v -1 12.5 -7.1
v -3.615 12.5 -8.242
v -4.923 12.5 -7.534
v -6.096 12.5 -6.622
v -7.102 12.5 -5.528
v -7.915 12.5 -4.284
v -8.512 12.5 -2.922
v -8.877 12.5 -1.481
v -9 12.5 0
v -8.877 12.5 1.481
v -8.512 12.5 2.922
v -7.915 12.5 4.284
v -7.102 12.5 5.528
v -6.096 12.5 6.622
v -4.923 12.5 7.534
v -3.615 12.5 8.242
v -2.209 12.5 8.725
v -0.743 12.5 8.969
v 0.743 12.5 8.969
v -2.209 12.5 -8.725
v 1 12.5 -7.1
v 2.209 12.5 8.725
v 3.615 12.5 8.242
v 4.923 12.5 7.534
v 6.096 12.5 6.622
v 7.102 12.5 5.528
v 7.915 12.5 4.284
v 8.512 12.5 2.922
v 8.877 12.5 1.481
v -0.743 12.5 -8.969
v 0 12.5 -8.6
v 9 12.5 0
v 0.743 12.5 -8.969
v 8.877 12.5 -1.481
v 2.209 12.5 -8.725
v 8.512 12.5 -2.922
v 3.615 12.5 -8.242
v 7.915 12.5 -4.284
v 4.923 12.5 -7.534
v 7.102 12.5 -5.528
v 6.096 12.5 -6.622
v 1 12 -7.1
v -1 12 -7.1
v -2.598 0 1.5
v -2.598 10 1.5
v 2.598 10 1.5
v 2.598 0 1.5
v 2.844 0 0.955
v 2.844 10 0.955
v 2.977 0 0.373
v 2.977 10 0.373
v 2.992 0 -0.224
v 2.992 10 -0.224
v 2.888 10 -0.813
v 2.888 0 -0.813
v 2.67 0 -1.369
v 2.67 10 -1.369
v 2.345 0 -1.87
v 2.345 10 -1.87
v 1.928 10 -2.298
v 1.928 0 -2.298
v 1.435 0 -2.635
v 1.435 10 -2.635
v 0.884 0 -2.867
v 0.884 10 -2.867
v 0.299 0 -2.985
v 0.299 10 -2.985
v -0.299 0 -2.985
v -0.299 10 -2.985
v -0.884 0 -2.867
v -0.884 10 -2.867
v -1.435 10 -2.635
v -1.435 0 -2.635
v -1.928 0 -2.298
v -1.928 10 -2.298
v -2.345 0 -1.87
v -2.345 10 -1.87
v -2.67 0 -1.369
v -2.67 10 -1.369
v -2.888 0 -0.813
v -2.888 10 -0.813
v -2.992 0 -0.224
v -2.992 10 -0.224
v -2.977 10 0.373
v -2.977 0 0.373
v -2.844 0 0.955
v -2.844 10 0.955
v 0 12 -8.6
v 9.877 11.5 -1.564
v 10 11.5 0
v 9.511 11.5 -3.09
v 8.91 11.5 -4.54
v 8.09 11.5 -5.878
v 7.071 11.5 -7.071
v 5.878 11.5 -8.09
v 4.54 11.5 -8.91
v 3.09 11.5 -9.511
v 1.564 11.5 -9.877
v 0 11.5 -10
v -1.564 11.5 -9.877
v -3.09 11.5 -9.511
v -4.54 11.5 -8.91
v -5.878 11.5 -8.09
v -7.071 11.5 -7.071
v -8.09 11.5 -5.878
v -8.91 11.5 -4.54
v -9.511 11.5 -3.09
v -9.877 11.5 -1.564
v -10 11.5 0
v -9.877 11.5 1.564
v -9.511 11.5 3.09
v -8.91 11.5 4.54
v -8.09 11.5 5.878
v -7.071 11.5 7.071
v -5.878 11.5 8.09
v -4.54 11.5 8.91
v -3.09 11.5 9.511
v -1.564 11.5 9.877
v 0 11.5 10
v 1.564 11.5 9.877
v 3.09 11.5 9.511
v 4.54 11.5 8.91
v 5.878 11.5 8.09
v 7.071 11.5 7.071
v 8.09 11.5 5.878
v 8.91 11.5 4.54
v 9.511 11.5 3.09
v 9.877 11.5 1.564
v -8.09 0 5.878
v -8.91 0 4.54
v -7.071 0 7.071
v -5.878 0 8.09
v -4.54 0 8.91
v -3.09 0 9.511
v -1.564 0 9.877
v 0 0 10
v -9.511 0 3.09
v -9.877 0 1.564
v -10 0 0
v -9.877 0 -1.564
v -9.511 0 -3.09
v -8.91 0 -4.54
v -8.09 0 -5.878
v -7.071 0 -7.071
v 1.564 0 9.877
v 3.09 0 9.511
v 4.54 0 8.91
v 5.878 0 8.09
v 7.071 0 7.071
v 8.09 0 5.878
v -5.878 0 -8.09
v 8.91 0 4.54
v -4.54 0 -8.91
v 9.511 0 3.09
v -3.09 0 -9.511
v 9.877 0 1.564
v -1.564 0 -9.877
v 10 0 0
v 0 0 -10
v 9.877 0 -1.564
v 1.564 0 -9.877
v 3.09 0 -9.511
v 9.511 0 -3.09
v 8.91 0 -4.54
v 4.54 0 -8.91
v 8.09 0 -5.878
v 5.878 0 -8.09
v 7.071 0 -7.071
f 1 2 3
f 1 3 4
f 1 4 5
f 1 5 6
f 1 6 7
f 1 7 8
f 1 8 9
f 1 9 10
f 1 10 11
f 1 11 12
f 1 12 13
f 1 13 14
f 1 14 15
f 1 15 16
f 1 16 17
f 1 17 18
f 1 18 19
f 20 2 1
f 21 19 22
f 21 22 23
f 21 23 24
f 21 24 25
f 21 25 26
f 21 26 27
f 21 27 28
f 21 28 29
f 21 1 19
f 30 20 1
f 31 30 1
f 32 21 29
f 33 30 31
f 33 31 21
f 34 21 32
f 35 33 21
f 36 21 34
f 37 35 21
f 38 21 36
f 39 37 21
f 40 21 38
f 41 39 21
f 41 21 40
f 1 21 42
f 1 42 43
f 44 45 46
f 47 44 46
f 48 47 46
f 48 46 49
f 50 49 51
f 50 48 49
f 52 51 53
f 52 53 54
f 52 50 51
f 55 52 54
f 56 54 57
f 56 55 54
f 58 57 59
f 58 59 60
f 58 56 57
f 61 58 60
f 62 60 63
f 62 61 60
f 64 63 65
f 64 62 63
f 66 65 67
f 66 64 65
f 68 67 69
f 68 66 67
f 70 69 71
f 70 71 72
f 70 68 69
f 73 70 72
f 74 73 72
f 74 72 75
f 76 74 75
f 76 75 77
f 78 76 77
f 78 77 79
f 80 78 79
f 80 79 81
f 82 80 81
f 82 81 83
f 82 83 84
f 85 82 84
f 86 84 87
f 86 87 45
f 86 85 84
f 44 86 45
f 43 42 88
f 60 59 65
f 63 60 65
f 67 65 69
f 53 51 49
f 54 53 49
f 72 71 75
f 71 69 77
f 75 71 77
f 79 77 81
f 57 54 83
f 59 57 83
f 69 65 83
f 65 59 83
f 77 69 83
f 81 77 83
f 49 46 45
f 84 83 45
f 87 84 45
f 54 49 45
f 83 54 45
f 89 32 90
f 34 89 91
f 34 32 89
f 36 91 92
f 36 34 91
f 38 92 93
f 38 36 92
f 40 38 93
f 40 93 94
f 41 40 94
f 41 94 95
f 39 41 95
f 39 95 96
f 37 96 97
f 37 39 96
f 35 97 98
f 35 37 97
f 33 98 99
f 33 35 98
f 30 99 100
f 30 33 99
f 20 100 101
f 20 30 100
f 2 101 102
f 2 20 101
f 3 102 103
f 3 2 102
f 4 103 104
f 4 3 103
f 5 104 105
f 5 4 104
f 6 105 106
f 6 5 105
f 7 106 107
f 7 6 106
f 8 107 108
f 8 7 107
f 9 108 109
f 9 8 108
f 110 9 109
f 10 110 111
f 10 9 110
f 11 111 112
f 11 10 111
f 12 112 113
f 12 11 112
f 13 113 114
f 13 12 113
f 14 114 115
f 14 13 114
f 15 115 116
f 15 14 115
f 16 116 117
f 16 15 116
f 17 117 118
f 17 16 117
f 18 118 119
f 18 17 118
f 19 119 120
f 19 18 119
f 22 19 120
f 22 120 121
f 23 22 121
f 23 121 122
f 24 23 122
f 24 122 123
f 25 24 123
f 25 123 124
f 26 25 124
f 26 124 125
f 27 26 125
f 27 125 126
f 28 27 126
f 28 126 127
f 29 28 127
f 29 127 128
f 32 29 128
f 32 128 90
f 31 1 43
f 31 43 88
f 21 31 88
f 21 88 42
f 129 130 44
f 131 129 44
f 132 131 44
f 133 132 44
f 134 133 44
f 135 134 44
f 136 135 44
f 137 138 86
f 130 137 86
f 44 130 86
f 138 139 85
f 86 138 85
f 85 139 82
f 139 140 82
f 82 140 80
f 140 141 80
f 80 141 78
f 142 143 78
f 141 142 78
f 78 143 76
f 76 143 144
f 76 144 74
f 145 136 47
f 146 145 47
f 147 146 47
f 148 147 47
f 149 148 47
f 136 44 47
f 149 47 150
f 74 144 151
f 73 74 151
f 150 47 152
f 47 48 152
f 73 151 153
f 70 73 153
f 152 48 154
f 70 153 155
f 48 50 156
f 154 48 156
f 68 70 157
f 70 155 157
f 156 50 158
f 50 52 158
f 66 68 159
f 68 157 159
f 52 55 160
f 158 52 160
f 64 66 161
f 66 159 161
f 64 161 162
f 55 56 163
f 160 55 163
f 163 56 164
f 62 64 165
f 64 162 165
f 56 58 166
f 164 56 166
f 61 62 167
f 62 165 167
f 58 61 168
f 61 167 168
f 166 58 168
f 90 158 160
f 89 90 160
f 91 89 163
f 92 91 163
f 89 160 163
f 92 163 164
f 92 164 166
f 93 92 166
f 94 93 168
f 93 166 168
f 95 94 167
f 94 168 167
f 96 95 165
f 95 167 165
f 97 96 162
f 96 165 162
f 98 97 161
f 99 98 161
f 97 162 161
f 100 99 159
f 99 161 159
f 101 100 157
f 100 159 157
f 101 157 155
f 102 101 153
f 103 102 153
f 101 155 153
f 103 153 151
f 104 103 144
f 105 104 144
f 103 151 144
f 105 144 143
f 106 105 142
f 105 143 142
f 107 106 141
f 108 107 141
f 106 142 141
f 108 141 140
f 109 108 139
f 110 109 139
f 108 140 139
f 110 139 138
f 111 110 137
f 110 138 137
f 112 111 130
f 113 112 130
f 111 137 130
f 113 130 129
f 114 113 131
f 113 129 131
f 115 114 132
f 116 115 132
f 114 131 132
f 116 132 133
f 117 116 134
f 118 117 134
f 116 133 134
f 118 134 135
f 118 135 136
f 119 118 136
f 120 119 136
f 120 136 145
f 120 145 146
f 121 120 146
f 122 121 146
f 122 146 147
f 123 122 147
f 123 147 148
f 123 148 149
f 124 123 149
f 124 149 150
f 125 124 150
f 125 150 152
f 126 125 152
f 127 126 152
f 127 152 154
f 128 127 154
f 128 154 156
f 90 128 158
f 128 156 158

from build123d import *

# Parameters (mm, degrees)
SKETCH1_R           = 10
BOSS_EXTRUDE1_DEPTH = 12.5
CUT_EXTRUDE1_DEPTH  = 10
CUT_EXTRUDE2_DEPTH  = 0.5
CHAMFER1_SIZE       = 1


with BuildPart() as part:
    # Sketch1 → Boss-Extrude1 (new body)
    with BuildSketch(Plane(origin=(0, 0, 0), x_dir=(1, 0, 0), z_dir=(0, 1, 0))):
        Circle(SKETCH1_R)
    extrude(amount=BOSS_EXTRUDE1_DEPTH)

    # Sketch2 → Cut-Extrude1 (cut)
    with BuildSketch(Plane.XZ):
        with BuildLine():
            Line((-2.598076211, 1.5), (2.598076211, 1.5))
            ThreePointArc((2.598076211, 1.5), (0, -3), (-2.598076211, 1.5))
        make_face()
    extrude(amount=-CUT_EXTRUDE1_DEPTH, mode=Mode.SUBTRACT)

    # Sketch3 → Cut-Extrude2 (cut)
    with BuildSketch(Plane(origin=(0, 12.5, 0), x_dir=(1, 0, 0), z_dir=(0, 1, 0))):
        Polygon((-1, 7.1), (0, 8.6), (1, 7.1), align=None)
    extrude(amount=-CUT_EXTRUDE2_DEPTH, mode=Mode.SUBTRACT)

    # Chamfer1
    chamfer1_edges = [part.edges().sort_by_distance(p)[0] for p in [
        (-10, 12.5, 0),
    ]]
    chamfer(chamfer1_edges, length=CHAMFER1_SIZE)


solid = part.part
